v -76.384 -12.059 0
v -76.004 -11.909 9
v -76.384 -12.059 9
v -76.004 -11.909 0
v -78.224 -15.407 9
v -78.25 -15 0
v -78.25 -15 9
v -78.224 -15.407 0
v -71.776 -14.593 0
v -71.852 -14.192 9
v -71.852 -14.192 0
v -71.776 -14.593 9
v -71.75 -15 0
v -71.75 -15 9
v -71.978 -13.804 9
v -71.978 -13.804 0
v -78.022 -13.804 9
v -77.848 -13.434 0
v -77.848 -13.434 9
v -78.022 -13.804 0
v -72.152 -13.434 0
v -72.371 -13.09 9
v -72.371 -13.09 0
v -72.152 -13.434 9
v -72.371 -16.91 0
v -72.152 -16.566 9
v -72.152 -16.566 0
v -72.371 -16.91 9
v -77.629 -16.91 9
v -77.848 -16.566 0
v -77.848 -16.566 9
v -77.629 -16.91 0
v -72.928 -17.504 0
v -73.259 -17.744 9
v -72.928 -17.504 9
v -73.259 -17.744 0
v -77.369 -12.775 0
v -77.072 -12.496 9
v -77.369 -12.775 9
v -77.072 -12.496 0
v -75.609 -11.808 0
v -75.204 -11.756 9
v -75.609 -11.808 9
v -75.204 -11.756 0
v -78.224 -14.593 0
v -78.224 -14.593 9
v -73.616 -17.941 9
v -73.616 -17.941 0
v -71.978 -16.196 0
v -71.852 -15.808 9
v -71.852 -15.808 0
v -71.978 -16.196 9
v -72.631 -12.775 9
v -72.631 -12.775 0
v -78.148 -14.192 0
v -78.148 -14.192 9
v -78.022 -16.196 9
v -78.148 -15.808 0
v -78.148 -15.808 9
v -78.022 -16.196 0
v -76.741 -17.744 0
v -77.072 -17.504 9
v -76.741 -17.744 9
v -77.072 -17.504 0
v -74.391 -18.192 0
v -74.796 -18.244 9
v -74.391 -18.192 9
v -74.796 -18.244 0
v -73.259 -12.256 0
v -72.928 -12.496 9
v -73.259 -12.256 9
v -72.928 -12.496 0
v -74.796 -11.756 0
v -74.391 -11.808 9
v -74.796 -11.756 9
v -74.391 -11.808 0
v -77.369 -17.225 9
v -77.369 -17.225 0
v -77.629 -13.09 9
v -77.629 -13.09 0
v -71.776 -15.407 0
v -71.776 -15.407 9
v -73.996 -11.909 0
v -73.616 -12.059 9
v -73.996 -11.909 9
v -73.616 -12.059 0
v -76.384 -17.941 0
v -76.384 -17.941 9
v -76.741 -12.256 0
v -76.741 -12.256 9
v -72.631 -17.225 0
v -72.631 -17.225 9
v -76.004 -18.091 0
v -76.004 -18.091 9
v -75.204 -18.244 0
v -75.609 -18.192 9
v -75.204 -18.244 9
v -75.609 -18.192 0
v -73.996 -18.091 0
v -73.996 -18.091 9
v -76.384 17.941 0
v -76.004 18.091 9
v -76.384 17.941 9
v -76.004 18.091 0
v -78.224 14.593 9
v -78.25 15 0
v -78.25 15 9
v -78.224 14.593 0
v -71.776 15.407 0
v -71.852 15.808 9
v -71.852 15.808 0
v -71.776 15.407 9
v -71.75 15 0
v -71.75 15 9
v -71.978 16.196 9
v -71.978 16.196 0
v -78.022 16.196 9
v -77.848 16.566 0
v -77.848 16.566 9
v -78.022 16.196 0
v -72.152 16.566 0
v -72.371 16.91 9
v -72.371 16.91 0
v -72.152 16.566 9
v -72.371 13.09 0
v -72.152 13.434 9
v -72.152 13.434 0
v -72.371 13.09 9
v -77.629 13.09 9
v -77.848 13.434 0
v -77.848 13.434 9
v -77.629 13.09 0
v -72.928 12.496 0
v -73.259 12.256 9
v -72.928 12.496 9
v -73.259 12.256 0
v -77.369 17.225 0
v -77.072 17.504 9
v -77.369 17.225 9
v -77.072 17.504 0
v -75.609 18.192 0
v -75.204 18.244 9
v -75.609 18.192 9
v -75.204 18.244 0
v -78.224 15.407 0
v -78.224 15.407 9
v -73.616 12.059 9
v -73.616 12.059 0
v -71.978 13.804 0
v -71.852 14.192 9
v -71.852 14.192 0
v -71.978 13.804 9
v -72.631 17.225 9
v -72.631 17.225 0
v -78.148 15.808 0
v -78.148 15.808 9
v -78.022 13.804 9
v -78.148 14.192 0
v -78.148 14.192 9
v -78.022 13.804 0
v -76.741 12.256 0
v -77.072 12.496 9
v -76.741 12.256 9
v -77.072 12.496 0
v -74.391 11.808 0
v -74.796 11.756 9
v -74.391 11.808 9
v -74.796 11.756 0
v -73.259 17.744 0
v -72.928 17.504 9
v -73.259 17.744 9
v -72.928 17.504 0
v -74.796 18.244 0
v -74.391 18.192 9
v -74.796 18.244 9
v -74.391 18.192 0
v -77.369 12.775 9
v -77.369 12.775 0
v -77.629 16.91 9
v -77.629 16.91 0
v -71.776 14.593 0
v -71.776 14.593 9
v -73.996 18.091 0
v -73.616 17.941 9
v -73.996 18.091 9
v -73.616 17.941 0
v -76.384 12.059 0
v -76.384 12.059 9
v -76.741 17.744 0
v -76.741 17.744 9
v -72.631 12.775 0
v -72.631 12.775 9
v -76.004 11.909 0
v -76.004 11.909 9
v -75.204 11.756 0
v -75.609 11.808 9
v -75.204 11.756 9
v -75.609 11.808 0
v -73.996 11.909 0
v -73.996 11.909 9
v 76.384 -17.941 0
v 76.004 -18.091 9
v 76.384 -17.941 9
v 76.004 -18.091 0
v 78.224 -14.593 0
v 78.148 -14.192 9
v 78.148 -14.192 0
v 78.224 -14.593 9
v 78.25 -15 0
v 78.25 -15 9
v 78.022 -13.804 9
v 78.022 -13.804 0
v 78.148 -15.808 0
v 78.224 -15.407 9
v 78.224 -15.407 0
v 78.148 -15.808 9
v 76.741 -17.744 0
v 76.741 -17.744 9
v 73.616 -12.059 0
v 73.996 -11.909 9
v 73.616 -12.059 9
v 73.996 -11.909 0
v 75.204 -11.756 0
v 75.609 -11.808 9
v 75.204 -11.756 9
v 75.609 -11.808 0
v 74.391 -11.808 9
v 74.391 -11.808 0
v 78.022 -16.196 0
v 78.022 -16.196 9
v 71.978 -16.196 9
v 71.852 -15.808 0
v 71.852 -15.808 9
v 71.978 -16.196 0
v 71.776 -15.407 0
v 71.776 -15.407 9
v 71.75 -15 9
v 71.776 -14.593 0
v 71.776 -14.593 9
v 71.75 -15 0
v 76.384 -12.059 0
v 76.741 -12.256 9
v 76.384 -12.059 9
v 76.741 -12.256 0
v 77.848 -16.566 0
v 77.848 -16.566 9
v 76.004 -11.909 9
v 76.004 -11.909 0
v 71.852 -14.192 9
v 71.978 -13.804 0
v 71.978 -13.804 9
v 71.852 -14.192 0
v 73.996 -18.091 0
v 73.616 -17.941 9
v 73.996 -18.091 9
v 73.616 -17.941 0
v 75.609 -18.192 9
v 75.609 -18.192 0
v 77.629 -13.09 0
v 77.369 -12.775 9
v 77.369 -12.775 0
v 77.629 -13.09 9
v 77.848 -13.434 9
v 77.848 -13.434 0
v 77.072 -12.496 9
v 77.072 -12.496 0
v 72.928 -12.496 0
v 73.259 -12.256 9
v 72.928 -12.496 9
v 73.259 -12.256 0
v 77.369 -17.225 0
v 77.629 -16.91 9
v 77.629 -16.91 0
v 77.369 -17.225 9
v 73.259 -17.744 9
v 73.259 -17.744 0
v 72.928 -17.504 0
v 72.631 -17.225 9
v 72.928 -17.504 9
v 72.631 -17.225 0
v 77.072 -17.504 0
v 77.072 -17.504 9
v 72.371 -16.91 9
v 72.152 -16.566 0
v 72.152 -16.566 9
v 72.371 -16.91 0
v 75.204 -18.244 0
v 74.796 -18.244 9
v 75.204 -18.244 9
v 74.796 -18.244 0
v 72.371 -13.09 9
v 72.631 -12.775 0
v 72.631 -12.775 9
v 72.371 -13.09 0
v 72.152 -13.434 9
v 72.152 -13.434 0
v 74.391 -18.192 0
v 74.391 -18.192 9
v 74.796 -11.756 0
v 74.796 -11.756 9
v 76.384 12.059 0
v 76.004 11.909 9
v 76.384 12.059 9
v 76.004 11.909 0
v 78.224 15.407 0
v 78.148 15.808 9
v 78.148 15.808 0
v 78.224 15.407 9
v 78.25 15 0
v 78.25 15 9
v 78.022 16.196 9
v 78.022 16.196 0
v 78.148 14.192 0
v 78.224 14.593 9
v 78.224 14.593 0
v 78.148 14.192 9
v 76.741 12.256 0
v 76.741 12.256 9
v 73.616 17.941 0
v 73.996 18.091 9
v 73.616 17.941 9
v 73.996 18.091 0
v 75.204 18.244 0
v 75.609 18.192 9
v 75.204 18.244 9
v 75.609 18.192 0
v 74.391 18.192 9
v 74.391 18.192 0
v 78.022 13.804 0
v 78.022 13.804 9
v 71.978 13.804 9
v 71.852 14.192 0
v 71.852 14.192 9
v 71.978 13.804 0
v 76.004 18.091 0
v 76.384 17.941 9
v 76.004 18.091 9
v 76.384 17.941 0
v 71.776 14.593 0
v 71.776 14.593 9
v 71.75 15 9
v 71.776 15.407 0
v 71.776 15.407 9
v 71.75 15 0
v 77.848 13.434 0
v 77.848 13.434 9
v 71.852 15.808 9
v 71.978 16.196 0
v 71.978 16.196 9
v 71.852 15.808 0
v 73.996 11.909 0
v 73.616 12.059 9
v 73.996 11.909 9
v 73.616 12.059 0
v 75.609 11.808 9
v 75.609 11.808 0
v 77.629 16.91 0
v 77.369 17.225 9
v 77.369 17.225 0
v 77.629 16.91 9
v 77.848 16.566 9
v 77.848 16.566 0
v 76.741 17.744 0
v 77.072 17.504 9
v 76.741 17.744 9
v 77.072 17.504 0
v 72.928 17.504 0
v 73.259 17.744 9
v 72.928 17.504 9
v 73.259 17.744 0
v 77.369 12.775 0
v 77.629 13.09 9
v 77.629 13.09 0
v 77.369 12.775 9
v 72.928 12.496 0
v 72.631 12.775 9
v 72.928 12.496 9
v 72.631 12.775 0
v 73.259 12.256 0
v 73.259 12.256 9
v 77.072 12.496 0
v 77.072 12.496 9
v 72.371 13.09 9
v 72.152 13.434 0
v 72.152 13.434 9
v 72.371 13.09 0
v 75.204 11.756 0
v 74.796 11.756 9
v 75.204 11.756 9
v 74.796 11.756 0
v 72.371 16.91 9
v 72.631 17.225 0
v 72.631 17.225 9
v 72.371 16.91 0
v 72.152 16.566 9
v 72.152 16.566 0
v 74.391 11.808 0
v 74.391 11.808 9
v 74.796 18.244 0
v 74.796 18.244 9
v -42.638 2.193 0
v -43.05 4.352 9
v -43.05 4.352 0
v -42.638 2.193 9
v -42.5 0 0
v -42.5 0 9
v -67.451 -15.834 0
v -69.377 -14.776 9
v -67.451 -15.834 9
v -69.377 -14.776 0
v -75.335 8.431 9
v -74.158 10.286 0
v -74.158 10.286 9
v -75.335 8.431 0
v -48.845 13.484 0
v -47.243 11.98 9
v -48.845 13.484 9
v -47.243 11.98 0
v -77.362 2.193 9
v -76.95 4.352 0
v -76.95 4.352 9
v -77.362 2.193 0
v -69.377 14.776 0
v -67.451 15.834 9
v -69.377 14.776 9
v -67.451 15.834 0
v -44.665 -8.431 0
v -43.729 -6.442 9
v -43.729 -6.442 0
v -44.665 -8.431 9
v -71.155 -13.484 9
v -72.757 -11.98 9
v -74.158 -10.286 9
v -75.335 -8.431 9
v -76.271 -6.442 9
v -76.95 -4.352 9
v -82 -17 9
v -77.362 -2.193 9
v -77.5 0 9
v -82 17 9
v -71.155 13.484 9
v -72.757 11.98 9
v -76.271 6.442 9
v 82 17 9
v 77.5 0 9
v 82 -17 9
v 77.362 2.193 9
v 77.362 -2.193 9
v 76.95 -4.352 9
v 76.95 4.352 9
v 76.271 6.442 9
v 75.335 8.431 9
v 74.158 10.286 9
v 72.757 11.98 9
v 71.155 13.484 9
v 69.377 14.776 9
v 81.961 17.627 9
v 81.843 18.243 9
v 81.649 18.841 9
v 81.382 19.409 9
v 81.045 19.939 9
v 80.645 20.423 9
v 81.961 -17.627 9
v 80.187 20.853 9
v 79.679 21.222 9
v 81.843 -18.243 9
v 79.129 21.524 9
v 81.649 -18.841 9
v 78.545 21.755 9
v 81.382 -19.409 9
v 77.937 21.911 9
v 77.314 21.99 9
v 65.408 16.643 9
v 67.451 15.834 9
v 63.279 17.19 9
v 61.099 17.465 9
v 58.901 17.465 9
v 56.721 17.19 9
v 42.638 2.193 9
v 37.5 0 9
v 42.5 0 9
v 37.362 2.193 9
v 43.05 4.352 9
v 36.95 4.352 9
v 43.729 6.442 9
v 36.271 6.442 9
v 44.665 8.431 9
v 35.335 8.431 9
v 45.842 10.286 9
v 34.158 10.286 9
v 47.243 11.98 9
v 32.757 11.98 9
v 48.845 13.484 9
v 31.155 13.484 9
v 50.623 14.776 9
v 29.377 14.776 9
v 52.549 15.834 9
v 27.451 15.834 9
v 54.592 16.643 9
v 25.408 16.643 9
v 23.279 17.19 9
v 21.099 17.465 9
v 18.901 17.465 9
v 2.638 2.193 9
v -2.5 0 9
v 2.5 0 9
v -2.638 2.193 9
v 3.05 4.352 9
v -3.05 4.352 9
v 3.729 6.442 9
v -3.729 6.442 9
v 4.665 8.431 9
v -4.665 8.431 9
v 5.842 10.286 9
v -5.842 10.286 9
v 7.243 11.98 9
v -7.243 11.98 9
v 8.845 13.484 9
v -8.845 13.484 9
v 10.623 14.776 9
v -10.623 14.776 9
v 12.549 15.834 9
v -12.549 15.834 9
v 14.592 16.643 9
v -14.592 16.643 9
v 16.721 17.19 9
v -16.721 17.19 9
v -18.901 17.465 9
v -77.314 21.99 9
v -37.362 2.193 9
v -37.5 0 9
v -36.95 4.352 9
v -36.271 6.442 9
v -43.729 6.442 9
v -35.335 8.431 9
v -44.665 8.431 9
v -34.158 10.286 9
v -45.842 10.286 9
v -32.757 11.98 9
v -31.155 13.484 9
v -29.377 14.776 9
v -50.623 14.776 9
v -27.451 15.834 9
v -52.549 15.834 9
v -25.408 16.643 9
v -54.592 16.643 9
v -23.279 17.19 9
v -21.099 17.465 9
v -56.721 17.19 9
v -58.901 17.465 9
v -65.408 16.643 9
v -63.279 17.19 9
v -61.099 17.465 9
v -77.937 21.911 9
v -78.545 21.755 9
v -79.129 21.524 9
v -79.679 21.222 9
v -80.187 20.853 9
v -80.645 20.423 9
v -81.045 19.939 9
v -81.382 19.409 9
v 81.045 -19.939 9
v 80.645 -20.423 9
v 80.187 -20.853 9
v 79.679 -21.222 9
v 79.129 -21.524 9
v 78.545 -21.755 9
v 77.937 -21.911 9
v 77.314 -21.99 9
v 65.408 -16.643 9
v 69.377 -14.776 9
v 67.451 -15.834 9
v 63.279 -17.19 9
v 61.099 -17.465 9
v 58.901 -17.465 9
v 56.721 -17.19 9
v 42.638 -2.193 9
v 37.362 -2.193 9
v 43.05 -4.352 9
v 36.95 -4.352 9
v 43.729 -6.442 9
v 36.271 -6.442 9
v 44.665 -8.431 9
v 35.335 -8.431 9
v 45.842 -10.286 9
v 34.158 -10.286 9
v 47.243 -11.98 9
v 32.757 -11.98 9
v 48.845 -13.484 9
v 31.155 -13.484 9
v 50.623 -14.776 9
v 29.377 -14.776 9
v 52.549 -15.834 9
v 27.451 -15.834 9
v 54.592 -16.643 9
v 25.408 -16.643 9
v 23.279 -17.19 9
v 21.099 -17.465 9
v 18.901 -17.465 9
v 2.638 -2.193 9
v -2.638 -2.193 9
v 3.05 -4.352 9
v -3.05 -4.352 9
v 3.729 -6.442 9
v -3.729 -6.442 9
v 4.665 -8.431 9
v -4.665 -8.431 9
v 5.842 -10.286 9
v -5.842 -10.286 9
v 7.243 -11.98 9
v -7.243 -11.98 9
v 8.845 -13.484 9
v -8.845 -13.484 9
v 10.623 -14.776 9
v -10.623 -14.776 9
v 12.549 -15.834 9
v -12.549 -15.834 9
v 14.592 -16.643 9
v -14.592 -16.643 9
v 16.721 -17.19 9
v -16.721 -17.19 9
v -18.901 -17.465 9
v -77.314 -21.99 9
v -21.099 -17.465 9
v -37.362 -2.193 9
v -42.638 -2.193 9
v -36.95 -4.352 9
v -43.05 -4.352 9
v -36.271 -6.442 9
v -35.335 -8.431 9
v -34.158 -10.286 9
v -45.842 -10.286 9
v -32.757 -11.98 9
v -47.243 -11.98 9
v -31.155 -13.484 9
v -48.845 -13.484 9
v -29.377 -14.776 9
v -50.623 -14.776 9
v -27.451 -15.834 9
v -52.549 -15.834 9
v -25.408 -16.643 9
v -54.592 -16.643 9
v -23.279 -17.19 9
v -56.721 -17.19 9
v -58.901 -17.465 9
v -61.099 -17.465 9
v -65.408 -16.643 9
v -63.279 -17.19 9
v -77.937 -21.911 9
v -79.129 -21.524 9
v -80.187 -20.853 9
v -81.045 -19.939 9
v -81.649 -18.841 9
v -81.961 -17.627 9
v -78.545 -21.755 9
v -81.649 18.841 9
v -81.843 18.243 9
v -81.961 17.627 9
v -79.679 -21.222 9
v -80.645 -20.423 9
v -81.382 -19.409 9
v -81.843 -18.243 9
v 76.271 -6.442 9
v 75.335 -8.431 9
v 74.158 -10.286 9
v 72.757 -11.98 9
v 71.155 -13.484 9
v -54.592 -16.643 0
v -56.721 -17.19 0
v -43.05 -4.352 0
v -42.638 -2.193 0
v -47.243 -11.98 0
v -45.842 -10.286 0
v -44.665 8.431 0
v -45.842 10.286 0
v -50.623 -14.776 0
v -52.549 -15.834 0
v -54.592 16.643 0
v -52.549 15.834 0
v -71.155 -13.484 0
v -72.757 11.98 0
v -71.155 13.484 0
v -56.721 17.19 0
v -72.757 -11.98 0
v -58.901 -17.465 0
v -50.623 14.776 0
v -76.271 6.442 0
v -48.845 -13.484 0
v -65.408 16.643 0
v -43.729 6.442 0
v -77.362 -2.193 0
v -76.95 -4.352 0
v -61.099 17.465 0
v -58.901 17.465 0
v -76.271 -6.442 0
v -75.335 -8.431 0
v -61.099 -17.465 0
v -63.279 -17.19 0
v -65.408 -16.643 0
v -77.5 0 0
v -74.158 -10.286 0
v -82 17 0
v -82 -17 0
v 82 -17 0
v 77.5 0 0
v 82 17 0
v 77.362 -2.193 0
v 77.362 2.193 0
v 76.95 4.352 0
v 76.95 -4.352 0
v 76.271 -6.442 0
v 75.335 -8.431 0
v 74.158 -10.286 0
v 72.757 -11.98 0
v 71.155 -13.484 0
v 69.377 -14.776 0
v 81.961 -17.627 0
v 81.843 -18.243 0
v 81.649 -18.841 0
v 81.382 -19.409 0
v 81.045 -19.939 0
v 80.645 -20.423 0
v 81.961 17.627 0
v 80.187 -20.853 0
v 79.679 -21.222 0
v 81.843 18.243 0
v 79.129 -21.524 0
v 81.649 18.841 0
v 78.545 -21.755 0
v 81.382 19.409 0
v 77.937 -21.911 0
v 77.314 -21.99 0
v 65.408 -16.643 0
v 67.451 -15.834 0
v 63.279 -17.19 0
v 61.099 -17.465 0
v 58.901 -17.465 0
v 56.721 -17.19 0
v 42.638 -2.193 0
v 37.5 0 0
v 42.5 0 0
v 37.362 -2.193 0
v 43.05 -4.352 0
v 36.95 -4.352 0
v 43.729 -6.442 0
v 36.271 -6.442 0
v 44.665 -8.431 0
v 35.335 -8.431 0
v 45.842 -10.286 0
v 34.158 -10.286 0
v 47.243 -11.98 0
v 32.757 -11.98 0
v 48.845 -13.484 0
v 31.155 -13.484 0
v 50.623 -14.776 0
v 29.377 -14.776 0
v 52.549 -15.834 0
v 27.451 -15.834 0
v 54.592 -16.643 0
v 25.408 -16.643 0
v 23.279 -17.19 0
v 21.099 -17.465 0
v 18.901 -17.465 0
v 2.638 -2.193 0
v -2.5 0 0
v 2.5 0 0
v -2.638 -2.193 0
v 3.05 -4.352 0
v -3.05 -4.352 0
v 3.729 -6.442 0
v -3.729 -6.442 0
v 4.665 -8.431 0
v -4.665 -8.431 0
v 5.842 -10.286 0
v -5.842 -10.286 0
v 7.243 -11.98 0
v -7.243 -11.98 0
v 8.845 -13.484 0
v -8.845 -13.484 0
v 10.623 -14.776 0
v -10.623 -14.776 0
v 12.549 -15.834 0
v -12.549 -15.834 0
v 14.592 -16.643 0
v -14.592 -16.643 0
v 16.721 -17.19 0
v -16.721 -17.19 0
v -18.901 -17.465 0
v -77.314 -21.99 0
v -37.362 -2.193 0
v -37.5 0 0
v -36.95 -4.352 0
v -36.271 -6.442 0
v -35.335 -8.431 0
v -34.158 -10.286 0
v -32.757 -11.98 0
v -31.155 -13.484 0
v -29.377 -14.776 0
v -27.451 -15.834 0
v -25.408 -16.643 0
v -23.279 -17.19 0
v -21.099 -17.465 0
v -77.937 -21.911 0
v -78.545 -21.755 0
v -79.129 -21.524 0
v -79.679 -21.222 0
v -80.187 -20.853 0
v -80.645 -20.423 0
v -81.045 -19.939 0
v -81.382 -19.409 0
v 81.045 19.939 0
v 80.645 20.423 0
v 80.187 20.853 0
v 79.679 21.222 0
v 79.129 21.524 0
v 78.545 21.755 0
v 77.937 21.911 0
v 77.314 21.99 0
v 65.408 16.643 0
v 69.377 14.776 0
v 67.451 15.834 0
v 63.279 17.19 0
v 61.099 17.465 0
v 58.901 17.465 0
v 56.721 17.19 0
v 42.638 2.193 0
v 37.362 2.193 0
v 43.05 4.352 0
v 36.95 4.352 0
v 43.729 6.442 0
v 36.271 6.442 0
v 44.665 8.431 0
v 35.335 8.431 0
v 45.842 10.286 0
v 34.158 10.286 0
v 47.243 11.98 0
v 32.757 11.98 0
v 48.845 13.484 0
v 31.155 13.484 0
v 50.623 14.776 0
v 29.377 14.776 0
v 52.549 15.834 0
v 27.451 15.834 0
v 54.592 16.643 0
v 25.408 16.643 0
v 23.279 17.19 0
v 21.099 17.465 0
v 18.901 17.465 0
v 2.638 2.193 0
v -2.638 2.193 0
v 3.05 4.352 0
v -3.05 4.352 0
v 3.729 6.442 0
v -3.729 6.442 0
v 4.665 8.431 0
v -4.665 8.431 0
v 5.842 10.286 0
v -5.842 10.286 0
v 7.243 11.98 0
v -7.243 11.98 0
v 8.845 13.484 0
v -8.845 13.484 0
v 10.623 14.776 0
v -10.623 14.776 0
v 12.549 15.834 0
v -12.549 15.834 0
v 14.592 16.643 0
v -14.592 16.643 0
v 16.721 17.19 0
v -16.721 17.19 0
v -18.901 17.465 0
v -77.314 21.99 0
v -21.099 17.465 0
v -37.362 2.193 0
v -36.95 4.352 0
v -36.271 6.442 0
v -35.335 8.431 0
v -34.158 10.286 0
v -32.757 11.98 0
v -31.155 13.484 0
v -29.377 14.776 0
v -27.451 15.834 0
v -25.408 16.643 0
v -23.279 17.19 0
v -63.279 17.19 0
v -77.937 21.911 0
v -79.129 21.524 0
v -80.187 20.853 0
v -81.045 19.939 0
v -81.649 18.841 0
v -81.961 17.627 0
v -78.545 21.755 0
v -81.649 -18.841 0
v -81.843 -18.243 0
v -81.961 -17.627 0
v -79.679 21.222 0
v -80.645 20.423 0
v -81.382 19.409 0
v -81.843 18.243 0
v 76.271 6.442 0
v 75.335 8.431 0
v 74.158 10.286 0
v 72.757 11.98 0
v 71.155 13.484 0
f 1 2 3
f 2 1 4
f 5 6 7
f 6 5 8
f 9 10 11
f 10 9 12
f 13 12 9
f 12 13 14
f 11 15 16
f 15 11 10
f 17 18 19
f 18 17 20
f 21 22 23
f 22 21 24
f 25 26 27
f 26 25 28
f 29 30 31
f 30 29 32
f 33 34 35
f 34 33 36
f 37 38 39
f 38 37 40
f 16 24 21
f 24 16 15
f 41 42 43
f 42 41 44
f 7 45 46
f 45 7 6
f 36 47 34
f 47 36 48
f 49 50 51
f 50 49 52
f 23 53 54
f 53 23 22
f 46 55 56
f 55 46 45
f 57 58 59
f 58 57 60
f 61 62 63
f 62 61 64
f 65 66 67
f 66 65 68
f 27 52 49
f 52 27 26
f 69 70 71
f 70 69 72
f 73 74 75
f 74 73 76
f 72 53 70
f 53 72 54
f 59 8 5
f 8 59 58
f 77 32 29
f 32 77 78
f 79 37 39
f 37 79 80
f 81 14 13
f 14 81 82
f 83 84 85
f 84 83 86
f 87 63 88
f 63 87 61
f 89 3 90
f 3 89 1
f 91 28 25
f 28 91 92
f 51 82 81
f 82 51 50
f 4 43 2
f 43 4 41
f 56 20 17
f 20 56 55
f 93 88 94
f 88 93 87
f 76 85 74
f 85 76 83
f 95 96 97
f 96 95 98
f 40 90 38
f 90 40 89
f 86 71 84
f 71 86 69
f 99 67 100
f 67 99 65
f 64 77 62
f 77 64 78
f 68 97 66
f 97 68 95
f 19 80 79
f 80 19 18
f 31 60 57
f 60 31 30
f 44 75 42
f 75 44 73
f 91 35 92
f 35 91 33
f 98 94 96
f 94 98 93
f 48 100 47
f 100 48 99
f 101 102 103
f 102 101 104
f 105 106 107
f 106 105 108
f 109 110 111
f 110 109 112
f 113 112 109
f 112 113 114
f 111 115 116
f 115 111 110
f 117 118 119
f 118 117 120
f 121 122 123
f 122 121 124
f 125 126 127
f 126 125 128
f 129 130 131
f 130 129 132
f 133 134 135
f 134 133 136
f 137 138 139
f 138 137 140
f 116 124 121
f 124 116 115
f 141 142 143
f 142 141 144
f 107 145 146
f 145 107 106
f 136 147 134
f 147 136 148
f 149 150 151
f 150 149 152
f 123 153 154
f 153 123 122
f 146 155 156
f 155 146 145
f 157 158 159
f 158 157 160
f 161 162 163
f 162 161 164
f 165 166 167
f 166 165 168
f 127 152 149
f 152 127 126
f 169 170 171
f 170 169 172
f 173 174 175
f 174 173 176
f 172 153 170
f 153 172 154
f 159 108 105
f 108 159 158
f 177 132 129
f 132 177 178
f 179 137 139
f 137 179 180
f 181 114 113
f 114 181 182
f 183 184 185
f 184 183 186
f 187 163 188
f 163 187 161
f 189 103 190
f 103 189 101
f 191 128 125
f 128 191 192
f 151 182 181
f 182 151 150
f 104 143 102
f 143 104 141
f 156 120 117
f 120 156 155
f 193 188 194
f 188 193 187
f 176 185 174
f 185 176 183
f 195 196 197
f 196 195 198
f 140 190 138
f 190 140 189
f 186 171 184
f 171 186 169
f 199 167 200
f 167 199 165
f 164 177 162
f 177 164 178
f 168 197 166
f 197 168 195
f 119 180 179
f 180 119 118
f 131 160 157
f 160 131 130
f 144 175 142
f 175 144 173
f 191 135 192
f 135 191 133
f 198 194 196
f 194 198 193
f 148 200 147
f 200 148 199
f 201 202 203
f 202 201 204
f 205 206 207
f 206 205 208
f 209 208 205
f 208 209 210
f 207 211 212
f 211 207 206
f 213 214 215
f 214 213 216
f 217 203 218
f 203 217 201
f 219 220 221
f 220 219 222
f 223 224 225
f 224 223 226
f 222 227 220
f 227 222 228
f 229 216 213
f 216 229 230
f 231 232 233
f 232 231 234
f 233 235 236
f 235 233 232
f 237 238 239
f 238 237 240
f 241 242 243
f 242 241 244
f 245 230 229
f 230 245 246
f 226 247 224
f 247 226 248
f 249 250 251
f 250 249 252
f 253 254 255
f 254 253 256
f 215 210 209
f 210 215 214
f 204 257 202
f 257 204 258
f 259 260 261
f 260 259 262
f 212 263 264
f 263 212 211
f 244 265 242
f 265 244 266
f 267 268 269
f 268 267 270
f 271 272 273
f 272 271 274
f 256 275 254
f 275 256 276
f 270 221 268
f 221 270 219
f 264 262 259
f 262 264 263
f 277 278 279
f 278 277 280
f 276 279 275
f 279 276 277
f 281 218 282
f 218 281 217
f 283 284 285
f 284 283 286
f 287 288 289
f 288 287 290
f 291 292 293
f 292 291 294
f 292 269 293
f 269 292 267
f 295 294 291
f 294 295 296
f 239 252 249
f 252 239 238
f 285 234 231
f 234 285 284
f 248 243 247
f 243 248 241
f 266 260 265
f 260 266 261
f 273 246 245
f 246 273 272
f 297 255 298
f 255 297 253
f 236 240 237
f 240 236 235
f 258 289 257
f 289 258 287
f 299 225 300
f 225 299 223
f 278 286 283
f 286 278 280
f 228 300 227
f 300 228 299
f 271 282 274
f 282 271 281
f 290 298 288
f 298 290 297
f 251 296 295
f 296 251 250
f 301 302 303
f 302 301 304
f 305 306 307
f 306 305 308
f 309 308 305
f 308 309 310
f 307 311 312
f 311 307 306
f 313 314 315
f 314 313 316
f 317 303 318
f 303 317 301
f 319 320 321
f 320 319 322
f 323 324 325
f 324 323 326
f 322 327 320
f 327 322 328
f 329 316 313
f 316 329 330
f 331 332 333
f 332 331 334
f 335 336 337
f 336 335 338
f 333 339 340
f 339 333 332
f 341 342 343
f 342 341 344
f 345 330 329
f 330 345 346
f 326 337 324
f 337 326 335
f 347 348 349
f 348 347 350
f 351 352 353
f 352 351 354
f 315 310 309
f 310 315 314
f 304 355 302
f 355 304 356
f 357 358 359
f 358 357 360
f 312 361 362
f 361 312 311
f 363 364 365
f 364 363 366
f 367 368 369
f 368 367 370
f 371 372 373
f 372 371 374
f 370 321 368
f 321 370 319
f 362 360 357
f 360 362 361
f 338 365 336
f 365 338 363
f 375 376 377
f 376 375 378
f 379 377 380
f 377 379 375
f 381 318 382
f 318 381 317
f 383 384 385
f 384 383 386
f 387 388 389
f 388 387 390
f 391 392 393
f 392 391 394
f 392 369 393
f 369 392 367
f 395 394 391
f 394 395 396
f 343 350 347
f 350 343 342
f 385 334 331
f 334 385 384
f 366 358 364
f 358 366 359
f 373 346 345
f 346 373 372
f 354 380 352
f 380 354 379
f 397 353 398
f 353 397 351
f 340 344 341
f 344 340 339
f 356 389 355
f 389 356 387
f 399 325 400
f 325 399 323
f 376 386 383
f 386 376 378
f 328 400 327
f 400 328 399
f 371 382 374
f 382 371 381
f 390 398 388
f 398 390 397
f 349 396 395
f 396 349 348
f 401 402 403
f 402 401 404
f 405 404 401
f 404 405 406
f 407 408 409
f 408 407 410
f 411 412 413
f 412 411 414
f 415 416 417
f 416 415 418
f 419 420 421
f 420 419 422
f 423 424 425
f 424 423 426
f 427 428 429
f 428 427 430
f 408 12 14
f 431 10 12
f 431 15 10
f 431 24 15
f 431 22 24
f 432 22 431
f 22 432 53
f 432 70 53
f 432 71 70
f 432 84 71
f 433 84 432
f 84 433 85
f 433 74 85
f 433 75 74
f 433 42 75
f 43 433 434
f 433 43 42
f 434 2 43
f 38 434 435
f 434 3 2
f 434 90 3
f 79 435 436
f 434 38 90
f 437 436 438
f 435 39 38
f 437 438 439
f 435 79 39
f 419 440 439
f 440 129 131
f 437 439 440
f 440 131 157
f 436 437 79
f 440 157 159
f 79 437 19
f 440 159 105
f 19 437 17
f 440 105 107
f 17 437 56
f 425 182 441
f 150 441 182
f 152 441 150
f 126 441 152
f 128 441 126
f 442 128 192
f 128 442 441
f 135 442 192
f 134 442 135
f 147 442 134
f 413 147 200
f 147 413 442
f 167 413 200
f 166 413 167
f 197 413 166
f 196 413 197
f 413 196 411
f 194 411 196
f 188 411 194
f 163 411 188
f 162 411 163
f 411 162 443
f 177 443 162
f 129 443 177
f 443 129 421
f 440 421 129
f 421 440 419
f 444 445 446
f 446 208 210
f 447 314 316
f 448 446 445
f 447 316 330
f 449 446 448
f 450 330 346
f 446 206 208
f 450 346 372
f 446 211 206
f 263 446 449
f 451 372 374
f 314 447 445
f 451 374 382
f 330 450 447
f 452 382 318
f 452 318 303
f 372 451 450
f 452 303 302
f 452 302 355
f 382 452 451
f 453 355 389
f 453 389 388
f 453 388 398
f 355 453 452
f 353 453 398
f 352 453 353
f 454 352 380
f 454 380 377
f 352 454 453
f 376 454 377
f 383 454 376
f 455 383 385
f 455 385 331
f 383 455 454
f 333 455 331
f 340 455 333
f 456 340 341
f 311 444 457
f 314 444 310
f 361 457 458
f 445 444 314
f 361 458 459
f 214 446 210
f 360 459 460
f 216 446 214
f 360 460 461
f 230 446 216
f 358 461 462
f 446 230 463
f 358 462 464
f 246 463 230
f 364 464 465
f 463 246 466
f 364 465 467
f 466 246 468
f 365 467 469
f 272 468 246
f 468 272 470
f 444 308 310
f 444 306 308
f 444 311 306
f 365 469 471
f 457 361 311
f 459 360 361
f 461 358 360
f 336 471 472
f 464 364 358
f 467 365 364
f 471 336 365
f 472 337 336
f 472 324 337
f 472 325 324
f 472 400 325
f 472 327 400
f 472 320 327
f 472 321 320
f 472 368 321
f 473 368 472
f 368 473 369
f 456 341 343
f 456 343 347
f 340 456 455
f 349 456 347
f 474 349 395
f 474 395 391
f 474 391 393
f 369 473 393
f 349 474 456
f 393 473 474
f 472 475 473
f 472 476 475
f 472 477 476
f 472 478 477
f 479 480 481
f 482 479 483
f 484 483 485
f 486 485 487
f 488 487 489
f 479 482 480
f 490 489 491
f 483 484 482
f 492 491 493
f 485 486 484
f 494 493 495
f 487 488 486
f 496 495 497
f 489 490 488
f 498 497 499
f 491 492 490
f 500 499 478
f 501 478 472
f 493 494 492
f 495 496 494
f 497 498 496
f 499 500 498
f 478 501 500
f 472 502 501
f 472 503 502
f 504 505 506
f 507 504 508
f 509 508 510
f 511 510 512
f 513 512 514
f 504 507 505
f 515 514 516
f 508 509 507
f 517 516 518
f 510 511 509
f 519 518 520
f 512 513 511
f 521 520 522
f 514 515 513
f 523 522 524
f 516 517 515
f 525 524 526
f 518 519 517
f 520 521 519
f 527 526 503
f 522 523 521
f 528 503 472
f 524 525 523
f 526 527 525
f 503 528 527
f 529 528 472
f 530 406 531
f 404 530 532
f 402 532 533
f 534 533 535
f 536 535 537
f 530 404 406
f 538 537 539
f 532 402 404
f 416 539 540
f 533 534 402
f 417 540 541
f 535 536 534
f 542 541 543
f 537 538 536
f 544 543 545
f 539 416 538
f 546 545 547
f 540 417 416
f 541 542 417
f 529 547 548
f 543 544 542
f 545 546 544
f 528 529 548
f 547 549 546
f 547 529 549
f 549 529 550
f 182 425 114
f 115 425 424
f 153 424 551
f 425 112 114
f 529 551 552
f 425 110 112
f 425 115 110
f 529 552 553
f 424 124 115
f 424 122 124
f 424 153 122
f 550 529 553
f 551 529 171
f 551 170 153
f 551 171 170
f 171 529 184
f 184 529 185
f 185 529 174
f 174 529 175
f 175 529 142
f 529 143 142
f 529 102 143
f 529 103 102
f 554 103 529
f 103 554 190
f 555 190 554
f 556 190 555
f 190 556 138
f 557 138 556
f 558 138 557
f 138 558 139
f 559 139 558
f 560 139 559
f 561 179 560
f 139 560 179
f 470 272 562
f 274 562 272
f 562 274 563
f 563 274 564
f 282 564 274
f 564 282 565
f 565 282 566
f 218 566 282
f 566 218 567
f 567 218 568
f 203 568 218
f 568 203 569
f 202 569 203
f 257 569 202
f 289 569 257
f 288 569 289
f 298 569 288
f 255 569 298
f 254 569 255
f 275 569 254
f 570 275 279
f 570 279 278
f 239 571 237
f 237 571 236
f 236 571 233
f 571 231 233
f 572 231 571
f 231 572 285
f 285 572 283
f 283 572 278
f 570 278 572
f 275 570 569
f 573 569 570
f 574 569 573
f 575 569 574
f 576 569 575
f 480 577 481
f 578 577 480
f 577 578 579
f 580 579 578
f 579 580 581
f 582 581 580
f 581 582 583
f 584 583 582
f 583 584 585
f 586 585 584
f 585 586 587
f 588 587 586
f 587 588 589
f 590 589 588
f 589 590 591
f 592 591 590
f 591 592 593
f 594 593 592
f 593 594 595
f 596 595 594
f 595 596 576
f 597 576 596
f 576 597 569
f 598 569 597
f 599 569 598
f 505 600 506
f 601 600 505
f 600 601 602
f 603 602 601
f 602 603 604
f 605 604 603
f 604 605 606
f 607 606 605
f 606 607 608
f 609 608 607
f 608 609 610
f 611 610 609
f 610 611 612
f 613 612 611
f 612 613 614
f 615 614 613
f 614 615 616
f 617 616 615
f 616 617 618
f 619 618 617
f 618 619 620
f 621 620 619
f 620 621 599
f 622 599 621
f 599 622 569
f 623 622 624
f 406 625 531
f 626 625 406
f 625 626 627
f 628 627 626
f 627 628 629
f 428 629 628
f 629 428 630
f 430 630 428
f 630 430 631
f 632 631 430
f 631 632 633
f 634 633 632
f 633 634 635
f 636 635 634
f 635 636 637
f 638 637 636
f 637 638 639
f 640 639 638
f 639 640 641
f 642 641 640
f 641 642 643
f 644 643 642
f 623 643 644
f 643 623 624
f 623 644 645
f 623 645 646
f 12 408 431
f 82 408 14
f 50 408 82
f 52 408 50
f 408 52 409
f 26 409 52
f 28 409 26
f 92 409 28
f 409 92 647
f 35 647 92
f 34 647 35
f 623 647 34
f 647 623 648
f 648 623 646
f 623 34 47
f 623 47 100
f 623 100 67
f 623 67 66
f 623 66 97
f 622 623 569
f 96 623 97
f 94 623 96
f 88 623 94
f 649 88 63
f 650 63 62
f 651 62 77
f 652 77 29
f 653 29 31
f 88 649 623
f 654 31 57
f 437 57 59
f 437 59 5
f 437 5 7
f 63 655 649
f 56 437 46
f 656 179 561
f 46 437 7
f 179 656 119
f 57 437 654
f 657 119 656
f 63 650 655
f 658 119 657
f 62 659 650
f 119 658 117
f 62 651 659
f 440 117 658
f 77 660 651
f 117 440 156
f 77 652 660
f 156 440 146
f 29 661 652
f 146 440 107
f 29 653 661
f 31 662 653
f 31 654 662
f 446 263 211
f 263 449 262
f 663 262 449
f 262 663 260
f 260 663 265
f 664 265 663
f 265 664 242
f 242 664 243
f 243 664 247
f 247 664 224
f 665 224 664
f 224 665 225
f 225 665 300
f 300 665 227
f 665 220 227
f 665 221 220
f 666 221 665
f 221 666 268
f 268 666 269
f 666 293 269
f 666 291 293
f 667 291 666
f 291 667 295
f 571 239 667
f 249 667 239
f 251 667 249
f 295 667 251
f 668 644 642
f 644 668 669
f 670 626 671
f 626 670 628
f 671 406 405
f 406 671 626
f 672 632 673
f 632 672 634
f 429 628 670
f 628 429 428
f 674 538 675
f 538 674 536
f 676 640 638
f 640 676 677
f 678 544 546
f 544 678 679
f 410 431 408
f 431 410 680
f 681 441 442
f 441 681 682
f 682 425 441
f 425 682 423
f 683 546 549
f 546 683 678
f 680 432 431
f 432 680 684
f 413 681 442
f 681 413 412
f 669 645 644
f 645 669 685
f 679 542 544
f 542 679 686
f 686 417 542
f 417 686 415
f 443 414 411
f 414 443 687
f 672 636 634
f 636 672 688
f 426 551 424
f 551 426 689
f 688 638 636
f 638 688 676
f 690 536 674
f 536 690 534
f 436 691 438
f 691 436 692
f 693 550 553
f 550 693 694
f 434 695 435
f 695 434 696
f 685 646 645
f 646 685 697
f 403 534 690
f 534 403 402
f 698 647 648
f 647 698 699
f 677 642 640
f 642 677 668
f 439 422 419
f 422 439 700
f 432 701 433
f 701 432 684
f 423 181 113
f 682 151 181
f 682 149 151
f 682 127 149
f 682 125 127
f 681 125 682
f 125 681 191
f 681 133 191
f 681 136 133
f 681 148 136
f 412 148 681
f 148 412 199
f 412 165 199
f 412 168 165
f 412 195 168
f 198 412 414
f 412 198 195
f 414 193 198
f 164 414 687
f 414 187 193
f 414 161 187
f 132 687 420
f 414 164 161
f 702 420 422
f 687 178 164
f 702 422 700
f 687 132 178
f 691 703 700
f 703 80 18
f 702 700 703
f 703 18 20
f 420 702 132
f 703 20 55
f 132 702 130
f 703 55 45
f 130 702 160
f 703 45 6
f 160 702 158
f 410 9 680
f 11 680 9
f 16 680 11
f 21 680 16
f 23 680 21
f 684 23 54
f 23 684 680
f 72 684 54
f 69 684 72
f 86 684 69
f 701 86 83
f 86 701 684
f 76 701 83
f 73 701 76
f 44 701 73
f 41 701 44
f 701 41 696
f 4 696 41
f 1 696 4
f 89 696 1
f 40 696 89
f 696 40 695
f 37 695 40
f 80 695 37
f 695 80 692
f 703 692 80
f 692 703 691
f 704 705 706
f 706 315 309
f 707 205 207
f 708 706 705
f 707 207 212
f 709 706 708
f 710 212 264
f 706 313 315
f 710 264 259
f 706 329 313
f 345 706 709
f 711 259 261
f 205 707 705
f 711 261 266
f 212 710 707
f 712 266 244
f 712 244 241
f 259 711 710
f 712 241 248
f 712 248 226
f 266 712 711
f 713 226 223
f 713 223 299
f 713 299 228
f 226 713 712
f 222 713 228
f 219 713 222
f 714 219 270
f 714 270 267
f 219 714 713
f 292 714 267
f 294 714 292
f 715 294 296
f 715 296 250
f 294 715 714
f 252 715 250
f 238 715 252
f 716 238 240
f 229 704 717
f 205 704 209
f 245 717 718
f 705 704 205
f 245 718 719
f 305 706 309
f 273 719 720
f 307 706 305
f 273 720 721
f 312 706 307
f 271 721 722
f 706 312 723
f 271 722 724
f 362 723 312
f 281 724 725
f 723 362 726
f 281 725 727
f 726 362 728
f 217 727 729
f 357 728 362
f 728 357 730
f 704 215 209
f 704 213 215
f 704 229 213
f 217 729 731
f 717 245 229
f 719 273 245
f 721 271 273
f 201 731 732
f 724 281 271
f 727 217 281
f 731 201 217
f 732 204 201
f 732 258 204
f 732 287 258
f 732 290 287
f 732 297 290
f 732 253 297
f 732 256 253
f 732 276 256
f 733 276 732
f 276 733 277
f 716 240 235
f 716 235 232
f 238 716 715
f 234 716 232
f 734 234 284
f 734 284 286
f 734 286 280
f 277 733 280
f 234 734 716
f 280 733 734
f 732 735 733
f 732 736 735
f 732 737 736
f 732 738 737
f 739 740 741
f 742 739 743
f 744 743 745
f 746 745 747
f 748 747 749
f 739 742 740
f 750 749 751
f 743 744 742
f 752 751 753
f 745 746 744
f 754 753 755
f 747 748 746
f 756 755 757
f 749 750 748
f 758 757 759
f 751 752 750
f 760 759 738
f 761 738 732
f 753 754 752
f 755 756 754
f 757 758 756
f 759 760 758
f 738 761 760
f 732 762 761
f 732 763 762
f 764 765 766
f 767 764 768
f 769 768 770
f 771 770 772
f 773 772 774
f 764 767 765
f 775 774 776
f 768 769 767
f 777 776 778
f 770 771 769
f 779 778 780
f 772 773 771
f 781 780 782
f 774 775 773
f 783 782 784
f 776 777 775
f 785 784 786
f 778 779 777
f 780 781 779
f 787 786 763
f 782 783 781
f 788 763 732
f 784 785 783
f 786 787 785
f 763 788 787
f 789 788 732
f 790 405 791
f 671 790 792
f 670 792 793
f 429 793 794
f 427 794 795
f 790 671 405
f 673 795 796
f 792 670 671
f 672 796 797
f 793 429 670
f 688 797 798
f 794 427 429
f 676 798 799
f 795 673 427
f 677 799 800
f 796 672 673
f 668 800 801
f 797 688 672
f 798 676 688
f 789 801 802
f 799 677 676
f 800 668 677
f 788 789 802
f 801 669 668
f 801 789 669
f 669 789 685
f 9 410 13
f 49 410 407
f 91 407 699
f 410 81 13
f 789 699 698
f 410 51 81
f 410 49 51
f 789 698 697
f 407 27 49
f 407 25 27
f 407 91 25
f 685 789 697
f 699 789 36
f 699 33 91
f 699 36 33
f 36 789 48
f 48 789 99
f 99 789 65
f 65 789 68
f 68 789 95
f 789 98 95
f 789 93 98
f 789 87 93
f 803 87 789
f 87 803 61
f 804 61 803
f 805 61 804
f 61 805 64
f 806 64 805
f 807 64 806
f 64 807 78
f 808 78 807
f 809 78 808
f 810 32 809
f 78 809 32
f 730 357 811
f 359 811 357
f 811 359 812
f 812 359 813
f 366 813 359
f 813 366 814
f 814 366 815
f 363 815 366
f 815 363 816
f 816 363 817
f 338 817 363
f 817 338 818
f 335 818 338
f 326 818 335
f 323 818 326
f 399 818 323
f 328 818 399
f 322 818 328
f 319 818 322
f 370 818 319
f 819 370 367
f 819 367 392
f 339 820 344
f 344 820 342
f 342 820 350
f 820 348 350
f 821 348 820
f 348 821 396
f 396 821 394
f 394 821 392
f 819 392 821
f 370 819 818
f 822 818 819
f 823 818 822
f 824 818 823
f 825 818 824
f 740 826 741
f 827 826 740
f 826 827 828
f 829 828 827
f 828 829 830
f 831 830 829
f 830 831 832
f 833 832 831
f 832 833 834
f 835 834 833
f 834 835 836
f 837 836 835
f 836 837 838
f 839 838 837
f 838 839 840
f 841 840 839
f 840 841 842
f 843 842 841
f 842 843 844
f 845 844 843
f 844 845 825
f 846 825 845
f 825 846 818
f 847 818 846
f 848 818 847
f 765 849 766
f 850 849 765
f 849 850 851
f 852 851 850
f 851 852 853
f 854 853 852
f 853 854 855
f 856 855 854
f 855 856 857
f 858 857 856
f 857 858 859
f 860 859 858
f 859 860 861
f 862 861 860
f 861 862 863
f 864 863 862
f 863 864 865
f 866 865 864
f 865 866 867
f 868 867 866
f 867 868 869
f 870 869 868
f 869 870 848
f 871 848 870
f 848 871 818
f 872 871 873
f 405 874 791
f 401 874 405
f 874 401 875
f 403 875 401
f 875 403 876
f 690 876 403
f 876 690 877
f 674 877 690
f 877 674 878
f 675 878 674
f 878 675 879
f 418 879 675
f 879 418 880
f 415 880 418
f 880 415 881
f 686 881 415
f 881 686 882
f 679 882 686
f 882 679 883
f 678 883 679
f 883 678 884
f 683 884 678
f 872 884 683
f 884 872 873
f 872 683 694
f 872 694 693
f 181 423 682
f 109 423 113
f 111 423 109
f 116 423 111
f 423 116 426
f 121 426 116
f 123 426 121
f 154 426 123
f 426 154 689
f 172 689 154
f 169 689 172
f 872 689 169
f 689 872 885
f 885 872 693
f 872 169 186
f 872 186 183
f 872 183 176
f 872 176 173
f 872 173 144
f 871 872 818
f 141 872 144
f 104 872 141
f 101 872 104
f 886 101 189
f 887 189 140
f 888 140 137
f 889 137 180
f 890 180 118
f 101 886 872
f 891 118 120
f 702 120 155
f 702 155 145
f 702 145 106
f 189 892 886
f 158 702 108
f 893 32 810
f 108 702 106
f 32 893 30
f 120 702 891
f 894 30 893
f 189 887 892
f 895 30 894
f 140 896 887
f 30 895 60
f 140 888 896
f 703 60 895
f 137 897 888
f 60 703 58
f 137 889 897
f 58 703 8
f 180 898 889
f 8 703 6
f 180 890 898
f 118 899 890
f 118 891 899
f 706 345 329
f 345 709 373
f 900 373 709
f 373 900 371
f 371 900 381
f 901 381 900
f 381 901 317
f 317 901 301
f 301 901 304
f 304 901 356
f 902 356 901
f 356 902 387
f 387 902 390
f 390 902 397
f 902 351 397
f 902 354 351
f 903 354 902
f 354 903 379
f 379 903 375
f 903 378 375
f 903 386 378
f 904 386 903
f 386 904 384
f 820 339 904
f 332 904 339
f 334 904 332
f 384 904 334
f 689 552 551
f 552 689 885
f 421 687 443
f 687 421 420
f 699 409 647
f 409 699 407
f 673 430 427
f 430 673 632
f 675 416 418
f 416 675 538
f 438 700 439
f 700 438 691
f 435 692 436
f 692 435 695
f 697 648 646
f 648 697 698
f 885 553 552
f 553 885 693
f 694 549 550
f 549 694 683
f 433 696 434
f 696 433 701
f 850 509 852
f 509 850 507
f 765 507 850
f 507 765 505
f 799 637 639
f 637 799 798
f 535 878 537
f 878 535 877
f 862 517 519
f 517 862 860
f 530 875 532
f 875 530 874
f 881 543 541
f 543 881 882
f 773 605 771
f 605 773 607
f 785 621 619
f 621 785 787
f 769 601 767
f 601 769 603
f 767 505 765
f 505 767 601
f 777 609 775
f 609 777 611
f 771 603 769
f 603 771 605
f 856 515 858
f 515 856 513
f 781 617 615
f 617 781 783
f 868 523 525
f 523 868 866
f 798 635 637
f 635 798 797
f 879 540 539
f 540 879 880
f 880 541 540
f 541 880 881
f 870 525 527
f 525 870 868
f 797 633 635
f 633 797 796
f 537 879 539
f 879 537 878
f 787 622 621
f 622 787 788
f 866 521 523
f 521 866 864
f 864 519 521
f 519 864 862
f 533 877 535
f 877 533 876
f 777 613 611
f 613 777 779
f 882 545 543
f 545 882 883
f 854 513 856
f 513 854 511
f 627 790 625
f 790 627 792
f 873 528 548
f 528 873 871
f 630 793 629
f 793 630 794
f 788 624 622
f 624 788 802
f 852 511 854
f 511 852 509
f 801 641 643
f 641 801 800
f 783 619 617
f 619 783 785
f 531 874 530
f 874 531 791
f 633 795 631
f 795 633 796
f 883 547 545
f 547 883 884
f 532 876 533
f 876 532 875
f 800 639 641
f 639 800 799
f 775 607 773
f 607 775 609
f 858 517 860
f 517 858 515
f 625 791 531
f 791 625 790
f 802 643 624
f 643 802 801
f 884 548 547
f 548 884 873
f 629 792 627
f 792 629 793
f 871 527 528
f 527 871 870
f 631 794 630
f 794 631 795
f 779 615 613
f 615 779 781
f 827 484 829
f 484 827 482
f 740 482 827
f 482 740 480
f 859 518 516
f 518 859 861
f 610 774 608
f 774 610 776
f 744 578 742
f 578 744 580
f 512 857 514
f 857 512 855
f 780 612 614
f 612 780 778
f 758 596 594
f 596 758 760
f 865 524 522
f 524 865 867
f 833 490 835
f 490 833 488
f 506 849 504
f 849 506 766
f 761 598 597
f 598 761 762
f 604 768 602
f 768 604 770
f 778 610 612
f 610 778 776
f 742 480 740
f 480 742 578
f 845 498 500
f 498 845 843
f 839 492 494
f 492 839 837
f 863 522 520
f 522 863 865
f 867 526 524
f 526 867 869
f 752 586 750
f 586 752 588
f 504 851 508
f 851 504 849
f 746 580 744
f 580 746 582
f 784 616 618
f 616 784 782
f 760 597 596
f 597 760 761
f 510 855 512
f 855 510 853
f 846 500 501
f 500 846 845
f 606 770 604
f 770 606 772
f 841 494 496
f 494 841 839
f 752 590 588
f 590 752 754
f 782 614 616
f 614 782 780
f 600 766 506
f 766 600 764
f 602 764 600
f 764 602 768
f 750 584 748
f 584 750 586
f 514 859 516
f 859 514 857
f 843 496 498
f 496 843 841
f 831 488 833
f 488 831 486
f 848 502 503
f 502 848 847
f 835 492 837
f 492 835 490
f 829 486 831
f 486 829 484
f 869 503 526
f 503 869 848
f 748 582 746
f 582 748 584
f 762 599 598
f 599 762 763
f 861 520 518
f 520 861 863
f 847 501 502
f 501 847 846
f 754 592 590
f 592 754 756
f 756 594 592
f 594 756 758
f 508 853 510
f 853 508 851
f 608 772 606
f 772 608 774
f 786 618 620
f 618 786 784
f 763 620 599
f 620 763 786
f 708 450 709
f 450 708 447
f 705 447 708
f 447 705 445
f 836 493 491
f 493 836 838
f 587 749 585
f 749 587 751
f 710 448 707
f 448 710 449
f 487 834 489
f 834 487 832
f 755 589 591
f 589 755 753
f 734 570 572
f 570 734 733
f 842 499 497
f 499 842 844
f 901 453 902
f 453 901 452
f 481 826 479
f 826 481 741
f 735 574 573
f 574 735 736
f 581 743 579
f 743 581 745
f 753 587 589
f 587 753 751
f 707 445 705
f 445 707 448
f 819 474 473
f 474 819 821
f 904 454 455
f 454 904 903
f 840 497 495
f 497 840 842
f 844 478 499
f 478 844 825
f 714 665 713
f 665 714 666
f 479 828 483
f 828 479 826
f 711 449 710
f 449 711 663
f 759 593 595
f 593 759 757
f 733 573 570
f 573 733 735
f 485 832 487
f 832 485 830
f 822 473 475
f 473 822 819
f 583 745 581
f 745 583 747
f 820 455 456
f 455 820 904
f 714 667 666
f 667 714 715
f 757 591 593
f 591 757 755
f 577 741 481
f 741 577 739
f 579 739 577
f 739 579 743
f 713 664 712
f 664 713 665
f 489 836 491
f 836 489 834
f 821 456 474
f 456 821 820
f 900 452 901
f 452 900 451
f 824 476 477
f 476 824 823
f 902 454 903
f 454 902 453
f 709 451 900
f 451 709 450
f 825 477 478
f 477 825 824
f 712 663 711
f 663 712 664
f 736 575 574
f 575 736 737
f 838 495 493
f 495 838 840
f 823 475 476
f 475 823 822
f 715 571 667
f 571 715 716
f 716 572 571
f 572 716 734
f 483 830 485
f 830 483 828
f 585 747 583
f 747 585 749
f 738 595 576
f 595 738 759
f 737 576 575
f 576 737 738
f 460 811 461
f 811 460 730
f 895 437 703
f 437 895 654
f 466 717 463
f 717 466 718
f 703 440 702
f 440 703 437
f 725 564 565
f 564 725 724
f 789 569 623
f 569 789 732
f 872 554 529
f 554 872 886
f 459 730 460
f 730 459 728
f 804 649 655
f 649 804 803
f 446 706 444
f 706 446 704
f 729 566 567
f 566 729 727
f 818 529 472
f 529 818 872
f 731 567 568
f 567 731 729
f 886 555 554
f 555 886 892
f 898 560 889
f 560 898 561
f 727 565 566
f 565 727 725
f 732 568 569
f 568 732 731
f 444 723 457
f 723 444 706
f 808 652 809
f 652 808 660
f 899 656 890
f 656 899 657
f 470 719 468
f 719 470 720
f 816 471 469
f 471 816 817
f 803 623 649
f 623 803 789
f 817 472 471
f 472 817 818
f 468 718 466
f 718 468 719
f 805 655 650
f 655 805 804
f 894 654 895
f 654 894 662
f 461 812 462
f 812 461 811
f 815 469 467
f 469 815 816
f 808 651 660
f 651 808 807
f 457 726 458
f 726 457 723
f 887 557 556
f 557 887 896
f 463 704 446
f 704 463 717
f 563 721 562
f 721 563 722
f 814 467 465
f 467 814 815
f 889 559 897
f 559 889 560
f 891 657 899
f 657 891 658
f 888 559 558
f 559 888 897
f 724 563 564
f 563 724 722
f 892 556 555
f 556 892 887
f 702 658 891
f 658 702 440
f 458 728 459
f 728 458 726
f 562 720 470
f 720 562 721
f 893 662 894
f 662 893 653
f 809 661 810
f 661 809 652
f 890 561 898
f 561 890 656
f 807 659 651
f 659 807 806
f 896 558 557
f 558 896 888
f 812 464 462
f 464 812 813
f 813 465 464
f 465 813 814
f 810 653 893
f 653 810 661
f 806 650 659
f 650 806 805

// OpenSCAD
$fn = 50;


difference() {
	union() {
		hull() {
			translate(v = [-77.0000000000, 17.0000000000, 0]) {
				cylinder(h = 9, r = 5);
			}
			translate(v = [77.0000000000, 17.0000000000, 0]) {
				cylinder(h = 9, r = 5);
			}
			translate(v = [-77.0000000000, -17.0000000000, 0]) {
				cylinder(h = 9, r = 5);
			}
			translate(v = [77.0000000000, -17.0000000000, 0]) {
				cylinder(h = 9, r = 5);
			}
		}
	}
	union() {
		#translate(v = [-75.0000000000, -15.0000000000, -100.0000000000]) {
			cylinder(h = 200, r = 3.2500000000);
		}
		#translate(v = [-75.0000000000, 15.0000000000, -100.0000000000]) {
			cylinder(h = 200, r = 3.2500000000);
		}
		#translate(v = [75.0000000000, -15.0000000000, -100.0000000000]) {
			cylinder(h = 200, r = 3.2500000000);
		}
		#translate(v = [75.0000000000, 15.0000000000, -100.0000000000]) {
			cylinder(h = 200, r = 3.2500000000);
		}
		#translate(v = [-60.0000000000, 0, 0]) {
			cylinder(h = 9, r = 17.5000000000);
		}
		#translate(v = [-20.0000000000, 0, 0]) {
			cylinder(h = 9, r = 17.5000000000);
		}
		#translate(v = [20.0000000000, 0, 0]) {
			cylinder(h = 9, r = 17.5000000000);
		}
		#translate(v = [60.0000000000, 0, 0]) {
			cylinder(h = 9, r = 17.5000000000);
		}
	}
}
